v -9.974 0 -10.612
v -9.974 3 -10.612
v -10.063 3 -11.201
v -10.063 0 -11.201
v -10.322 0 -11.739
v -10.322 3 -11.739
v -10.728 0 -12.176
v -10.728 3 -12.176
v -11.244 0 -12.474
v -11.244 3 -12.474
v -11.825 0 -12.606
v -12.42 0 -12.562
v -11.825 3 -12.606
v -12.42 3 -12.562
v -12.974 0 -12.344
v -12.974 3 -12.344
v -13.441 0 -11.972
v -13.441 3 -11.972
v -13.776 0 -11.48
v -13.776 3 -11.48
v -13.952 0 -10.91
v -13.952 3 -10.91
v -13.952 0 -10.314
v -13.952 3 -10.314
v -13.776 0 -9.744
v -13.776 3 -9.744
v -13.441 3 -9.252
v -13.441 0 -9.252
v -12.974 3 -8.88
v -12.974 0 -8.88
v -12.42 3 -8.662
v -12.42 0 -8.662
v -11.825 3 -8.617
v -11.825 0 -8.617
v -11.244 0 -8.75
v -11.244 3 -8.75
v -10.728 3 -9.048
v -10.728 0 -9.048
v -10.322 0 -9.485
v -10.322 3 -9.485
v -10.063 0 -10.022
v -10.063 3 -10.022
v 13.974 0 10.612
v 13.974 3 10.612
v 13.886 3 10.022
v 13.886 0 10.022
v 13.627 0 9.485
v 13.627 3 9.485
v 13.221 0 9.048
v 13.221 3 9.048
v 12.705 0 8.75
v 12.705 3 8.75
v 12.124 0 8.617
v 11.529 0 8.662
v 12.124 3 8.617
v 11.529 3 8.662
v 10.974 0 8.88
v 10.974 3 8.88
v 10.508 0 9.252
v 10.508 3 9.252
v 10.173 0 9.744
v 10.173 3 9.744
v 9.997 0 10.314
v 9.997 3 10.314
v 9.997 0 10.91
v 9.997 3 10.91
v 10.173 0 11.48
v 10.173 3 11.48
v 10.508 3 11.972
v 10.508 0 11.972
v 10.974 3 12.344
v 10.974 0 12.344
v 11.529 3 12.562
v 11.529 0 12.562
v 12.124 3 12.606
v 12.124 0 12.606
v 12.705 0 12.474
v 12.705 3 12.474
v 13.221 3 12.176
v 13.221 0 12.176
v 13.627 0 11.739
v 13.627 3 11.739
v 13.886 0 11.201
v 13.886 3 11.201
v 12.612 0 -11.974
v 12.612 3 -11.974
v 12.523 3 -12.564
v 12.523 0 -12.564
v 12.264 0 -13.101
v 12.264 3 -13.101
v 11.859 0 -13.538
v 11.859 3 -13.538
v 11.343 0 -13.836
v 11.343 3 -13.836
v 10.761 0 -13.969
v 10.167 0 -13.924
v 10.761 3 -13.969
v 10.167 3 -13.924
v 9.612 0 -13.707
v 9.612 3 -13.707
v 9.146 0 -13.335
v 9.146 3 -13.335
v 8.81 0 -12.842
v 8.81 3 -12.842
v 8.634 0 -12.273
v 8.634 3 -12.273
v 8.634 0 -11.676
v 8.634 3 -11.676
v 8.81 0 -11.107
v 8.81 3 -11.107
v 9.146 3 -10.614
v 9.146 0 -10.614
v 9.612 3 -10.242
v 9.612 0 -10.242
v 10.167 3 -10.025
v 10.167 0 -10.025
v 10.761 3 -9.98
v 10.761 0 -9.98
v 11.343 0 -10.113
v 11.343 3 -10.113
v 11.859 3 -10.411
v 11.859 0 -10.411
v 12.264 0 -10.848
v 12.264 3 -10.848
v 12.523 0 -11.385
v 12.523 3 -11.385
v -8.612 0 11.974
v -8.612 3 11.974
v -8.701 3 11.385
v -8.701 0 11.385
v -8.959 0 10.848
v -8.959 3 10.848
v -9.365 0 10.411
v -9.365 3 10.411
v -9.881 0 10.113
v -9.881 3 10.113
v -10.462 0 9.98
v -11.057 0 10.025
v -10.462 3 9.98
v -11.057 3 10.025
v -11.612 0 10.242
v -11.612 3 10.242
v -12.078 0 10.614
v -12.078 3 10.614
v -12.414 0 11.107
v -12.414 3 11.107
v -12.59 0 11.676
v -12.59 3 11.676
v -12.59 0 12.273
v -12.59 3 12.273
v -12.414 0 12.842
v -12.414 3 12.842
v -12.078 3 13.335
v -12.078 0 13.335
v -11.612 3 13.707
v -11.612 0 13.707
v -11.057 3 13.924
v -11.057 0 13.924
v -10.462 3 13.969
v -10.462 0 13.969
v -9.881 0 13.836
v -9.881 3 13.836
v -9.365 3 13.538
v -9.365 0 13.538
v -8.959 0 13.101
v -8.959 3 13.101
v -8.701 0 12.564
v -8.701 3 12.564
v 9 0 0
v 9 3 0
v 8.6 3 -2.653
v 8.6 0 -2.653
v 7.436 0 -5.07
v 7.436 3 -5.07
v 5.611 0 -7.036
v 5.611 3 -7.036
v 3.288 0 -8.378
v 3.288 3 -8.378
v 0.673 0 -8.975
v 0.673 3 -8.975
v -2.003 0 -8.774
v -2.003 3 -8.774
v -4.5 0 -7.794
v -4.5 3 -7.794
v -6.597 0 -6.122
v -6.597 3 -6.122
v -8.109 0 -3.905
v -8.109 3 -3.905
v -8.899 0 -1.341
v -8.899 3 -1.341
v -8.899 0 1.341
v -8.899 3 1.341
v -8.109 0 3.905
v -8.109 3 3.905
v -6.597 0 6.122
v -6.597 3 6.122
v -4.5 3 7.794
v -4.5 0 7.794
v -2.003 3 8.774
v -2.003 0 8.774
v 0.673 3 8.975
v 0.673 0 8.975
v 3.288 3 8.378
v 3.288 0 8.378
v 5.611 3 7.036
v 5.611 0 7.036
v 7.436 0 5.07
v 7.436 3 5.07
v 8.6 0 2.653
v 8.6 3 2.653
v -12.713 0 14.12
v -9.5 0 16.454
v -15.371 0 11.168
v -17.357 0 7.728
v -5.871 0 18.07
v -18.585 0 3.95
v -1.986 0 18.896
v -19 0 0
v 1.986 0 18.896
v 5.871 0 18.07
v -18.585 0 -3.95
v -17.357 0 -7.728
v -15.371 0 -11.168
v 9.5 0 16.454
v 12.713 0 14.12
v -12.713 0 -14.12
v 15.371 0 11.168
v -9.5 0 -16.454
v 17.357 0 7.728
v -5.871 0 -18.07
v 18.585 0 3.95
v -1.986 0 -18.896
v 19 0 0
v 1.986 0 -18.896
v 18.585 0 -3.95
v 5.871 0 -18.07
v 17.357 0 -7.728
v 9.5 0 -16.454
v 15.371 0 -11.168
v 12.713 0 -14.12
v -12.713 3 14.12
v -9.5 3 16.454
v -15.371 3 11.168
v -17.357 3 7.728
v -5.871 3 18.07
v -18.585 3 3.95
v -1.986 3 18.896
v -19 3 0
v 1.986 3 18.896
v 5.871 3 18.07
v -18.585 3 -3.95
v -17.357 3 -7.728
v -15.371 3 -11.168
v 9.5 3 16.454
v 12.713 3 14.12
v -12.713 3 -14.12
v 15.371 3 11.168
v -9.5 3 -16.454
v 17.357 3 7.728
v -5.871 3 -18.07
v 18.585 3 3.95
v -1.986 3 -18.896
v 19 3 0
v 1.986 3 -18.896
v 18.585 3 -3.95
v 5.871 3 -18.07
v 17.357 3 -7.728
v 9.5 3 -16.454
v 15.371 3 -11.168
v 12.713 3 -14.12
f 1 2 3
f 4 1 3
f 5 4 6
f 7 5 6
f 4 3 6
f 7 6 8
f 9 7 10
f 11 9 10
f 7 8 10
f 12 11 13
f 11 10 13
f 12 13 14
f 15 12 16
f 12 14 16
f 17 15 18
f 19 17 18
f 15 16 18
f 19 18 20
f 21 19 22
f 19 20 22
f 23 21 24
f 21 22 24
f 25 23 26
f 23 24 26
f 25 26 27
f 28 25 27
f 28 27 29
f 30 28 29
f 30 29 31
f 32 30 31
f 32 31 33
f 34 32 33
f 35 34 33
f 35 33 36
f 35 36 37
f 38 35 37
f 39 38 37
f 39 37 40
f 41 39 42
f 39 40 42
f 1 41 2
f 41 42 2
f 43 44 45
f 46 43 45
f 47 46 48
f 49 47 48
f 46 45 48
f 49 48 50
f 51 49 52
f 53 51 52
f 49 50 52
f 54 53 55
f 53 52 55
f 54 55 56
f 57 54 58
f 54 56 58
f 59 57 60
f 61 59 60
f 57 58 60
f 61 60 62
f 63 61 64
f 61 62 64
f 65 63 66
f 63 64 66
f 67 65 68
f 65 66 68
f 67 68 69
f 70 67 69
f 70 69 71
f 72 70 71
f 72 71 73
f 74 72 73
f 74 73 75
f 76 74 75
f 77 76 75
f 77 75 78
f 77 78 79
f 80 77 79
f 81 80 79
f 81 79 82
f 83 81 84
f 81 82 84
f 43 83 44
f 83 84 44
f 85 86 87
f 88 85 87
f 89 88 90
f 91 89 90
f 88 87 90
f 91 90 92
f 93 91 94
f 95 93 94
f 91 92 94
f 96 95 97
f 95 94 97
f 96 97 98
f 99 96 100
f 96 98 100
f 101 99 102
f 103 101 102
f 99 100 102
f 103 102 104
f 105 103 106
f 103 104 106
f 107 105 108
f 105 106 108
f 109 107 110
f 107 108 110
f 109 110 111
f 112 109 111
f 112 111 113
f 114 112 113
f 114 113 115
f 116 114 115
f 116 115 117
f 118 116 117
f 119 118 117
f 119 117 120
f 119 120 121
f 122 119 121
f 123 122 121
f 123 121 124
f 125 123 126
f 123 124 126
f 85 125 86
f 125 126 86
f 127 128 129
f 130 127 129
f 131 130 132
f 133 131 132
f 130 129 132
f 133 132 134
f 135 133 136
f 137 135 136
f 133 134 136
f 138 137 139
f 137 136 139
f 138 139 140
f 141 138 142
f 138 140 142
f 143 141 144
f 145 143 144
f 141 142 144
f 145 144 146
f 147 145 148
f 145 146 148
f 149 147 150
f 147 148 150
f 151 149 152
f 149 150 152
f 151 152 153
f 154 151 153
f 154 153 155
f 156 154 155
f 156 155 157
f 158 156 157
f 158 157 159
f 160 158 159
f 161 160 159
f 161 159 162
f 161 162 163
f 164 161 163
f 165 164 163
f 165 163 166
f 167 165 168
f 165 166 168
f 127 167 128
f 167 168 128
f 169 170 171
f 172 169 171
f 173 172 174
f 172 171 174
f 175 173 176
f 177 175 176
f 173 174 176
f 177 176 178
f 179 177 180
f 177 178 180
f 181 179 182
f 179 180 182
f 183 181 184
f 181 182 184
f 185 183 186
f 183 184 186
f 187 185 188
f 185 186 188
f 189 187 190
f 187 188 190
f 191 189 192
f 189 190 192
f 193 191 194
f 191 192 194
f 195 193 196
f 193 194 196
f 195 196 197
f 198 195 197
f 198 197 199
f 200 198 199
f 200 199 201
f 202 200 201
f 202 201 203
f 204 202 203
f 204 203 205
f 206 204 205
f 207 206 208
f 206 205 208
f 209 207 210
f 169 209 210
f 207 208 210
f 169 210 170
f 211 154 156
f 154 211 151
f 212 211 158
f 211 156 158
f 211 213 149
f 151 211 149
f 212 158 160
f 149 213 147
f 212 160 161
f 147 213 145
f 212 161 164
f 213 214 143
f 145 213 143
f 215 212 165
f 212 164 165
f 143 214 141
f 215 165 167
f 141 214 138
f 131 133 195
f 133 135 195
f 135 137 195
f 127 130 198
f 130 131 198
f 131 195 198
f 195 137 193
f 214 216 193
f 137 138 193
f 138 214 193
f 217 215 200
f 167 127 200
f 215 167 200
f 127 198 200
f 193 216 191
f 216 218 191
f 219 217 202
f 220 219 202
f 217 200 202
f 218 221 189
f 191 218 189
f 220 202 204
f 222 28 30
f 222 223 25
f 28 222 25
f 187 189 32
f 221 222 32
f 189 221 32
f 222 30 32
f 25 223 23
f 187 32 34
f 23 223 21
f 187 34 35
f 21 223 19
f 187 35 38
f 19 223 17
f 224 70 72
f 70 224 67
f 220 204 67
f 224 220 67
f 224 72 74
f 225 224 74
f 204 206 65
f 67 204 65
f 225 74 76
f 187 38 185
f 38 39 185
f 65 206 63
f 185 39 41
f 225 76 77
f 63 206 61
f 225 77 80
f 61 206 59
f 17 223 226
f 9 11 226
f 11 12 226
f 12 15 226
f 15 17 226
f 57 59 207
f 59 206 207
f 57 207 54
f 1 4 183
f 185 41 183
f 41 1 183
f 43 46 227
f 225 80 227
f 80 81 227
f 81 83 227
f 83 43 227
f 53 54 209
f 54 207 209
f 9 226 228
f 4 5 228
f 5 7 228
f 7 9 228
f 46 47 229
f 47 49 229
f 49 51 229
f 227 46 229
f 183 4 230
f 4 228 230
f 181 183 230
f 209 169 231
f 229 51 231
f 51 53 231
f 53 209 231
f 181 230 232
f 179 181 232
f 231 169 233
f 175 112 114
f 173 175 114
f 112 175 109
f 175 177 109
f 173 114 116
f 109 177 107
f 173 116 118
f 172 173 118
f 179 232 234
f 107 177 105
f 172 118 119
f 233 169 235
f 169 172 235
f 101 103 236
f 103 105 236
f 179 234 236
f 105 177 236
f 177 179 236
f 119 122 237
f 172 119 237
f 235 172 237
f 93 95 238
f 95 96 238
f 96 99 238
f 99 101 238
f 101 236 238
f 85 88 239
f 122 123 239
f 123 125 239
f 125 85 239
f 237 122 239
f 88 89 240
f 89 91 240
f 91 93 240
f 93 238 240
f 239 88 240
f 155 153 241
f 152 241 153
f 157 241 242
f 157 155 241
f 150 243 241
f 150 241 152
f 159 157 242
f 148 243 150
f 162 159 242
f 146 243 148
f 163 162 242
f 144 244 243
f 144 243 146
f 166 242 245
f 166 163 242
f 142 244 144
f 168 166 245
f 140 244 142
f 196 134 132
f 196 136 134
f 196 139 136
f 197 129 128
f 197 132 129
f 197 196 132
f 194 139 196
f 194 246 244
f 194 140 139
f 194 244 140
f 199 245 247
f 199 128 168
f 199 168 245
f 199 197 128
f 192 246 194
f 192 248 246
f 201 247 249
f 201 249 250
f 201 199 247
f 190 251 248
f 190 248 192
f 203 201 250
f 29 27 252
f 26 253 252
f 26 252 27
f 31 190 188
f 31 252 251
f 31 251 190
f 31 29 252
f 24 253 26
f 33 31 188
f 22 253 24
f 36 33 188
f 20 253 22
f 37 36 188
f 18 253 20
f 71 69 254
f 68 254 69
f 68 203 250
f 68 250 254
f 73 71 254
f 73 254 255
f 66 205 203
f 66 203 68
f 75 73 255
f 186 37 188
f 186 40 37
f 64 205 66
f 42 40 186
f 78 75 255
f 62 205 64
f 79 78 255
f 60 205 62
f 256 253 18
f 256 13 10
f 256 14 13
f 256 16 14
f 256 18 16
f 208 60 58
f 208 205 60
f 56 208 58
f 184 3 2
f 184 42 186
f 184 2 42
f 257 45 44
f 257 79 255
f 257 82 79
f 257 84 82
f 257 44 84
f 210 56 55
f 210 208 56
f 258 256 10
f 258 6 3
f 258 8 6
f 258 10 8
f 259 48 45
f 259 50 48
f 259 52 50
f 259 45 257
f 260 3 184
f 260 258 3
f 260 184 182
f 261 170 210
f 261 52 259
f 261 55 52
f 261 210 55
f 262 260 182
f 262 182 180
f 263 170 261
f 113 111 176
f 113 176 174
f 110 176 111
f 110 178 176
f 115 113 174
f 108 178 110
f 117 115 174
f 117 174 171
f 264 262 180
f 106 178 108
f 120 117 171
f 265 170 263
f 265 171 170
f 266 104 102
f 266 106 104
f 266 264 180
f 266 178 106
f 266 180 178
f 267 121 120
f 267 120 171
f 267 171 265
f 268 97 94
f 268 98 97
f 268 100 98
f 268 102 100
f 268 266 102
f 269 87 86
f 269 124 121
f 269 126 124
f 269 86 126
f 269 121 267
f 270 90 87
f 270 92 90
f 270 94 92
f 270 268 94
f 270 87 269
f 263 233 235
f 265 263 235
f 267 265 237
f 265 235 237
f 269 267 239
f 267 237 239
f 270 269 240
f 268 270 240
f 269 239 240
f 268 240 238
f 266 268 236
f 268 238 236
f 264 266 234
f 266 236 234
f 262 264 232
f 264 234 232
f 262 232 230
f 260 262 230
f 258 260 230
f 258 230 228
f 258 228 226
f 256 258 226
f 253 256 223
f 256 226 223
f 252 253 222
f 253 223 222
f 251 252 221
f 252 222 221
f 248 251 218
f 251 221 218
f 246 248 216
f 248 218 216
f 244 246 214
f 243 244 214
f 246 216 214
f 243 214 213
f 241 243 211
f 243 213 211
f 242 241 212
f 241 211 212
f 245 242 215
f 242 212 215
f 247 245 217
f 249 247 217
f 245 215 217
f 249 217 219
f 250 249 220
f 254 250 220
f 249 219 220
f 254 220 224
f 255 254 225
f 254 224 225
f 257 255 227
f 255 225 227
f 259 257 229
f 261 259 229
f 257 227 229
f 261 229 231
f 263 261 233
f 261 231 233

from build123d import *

# Parameters (mm, degrees)
SKETCH1_R           = 19
BOSS_EXTRUDE1_DEPTH = 3
SKETCH2_R           = 2
CUT_EXTRUDE1_DEPTH  = 3
SKETCH3_R           = 9
CUT_EXTRUDE2_DEPTH  = 3


with BuildPart() as part:
    # Sketch1 → Boss-Extrude1 (new body)
    with BuildSketch(Plane(origin=(0, 0, 0), x_dir=(1, 0, 0), z_dir=(0, 1, 0))):
        Circle(SKETCH1_R)
    extrude(amount=BOSS_EXTRUDE1_DEPTH)

    # Sketch2 → Cut-Extrude1 (cut)
    with BuildSketch(Plane(origin=(0, 3, 0), x_dir=(1, 0, 0), z_dir=(0, 1, 0))):
        with Locations((-11.974482975, 10.611868708)):
            Circle(SKETCH2_R)
        with Locations((10.611868708, 11.974482975)):
            Circle(SKETCH2_R)
        with Locations((11.974482975, -10.611868708)):
            Circle(SKETCH2_R)
        with Locations((-10.611868708, -11.974482975)):
            Circle(SKETCH2_R)
    extrude(amount=-CUT_EXTRUDE1_DEPTH, mode=Mode.SUBTRACT)

    # Sketch3 → Cut-Extrude2 (cut)
    with BuildSketch(Plane(origin=(0, 3, 0), x_dir=(1, 0, 0), z_dir=(0, 1, 0))):
        Circle(SKETCH3_R)
    extrude(amount=-CUT_EXTRUDE2_DEPTH, mode=Mode.SUBTRACT)


solid = part.part
